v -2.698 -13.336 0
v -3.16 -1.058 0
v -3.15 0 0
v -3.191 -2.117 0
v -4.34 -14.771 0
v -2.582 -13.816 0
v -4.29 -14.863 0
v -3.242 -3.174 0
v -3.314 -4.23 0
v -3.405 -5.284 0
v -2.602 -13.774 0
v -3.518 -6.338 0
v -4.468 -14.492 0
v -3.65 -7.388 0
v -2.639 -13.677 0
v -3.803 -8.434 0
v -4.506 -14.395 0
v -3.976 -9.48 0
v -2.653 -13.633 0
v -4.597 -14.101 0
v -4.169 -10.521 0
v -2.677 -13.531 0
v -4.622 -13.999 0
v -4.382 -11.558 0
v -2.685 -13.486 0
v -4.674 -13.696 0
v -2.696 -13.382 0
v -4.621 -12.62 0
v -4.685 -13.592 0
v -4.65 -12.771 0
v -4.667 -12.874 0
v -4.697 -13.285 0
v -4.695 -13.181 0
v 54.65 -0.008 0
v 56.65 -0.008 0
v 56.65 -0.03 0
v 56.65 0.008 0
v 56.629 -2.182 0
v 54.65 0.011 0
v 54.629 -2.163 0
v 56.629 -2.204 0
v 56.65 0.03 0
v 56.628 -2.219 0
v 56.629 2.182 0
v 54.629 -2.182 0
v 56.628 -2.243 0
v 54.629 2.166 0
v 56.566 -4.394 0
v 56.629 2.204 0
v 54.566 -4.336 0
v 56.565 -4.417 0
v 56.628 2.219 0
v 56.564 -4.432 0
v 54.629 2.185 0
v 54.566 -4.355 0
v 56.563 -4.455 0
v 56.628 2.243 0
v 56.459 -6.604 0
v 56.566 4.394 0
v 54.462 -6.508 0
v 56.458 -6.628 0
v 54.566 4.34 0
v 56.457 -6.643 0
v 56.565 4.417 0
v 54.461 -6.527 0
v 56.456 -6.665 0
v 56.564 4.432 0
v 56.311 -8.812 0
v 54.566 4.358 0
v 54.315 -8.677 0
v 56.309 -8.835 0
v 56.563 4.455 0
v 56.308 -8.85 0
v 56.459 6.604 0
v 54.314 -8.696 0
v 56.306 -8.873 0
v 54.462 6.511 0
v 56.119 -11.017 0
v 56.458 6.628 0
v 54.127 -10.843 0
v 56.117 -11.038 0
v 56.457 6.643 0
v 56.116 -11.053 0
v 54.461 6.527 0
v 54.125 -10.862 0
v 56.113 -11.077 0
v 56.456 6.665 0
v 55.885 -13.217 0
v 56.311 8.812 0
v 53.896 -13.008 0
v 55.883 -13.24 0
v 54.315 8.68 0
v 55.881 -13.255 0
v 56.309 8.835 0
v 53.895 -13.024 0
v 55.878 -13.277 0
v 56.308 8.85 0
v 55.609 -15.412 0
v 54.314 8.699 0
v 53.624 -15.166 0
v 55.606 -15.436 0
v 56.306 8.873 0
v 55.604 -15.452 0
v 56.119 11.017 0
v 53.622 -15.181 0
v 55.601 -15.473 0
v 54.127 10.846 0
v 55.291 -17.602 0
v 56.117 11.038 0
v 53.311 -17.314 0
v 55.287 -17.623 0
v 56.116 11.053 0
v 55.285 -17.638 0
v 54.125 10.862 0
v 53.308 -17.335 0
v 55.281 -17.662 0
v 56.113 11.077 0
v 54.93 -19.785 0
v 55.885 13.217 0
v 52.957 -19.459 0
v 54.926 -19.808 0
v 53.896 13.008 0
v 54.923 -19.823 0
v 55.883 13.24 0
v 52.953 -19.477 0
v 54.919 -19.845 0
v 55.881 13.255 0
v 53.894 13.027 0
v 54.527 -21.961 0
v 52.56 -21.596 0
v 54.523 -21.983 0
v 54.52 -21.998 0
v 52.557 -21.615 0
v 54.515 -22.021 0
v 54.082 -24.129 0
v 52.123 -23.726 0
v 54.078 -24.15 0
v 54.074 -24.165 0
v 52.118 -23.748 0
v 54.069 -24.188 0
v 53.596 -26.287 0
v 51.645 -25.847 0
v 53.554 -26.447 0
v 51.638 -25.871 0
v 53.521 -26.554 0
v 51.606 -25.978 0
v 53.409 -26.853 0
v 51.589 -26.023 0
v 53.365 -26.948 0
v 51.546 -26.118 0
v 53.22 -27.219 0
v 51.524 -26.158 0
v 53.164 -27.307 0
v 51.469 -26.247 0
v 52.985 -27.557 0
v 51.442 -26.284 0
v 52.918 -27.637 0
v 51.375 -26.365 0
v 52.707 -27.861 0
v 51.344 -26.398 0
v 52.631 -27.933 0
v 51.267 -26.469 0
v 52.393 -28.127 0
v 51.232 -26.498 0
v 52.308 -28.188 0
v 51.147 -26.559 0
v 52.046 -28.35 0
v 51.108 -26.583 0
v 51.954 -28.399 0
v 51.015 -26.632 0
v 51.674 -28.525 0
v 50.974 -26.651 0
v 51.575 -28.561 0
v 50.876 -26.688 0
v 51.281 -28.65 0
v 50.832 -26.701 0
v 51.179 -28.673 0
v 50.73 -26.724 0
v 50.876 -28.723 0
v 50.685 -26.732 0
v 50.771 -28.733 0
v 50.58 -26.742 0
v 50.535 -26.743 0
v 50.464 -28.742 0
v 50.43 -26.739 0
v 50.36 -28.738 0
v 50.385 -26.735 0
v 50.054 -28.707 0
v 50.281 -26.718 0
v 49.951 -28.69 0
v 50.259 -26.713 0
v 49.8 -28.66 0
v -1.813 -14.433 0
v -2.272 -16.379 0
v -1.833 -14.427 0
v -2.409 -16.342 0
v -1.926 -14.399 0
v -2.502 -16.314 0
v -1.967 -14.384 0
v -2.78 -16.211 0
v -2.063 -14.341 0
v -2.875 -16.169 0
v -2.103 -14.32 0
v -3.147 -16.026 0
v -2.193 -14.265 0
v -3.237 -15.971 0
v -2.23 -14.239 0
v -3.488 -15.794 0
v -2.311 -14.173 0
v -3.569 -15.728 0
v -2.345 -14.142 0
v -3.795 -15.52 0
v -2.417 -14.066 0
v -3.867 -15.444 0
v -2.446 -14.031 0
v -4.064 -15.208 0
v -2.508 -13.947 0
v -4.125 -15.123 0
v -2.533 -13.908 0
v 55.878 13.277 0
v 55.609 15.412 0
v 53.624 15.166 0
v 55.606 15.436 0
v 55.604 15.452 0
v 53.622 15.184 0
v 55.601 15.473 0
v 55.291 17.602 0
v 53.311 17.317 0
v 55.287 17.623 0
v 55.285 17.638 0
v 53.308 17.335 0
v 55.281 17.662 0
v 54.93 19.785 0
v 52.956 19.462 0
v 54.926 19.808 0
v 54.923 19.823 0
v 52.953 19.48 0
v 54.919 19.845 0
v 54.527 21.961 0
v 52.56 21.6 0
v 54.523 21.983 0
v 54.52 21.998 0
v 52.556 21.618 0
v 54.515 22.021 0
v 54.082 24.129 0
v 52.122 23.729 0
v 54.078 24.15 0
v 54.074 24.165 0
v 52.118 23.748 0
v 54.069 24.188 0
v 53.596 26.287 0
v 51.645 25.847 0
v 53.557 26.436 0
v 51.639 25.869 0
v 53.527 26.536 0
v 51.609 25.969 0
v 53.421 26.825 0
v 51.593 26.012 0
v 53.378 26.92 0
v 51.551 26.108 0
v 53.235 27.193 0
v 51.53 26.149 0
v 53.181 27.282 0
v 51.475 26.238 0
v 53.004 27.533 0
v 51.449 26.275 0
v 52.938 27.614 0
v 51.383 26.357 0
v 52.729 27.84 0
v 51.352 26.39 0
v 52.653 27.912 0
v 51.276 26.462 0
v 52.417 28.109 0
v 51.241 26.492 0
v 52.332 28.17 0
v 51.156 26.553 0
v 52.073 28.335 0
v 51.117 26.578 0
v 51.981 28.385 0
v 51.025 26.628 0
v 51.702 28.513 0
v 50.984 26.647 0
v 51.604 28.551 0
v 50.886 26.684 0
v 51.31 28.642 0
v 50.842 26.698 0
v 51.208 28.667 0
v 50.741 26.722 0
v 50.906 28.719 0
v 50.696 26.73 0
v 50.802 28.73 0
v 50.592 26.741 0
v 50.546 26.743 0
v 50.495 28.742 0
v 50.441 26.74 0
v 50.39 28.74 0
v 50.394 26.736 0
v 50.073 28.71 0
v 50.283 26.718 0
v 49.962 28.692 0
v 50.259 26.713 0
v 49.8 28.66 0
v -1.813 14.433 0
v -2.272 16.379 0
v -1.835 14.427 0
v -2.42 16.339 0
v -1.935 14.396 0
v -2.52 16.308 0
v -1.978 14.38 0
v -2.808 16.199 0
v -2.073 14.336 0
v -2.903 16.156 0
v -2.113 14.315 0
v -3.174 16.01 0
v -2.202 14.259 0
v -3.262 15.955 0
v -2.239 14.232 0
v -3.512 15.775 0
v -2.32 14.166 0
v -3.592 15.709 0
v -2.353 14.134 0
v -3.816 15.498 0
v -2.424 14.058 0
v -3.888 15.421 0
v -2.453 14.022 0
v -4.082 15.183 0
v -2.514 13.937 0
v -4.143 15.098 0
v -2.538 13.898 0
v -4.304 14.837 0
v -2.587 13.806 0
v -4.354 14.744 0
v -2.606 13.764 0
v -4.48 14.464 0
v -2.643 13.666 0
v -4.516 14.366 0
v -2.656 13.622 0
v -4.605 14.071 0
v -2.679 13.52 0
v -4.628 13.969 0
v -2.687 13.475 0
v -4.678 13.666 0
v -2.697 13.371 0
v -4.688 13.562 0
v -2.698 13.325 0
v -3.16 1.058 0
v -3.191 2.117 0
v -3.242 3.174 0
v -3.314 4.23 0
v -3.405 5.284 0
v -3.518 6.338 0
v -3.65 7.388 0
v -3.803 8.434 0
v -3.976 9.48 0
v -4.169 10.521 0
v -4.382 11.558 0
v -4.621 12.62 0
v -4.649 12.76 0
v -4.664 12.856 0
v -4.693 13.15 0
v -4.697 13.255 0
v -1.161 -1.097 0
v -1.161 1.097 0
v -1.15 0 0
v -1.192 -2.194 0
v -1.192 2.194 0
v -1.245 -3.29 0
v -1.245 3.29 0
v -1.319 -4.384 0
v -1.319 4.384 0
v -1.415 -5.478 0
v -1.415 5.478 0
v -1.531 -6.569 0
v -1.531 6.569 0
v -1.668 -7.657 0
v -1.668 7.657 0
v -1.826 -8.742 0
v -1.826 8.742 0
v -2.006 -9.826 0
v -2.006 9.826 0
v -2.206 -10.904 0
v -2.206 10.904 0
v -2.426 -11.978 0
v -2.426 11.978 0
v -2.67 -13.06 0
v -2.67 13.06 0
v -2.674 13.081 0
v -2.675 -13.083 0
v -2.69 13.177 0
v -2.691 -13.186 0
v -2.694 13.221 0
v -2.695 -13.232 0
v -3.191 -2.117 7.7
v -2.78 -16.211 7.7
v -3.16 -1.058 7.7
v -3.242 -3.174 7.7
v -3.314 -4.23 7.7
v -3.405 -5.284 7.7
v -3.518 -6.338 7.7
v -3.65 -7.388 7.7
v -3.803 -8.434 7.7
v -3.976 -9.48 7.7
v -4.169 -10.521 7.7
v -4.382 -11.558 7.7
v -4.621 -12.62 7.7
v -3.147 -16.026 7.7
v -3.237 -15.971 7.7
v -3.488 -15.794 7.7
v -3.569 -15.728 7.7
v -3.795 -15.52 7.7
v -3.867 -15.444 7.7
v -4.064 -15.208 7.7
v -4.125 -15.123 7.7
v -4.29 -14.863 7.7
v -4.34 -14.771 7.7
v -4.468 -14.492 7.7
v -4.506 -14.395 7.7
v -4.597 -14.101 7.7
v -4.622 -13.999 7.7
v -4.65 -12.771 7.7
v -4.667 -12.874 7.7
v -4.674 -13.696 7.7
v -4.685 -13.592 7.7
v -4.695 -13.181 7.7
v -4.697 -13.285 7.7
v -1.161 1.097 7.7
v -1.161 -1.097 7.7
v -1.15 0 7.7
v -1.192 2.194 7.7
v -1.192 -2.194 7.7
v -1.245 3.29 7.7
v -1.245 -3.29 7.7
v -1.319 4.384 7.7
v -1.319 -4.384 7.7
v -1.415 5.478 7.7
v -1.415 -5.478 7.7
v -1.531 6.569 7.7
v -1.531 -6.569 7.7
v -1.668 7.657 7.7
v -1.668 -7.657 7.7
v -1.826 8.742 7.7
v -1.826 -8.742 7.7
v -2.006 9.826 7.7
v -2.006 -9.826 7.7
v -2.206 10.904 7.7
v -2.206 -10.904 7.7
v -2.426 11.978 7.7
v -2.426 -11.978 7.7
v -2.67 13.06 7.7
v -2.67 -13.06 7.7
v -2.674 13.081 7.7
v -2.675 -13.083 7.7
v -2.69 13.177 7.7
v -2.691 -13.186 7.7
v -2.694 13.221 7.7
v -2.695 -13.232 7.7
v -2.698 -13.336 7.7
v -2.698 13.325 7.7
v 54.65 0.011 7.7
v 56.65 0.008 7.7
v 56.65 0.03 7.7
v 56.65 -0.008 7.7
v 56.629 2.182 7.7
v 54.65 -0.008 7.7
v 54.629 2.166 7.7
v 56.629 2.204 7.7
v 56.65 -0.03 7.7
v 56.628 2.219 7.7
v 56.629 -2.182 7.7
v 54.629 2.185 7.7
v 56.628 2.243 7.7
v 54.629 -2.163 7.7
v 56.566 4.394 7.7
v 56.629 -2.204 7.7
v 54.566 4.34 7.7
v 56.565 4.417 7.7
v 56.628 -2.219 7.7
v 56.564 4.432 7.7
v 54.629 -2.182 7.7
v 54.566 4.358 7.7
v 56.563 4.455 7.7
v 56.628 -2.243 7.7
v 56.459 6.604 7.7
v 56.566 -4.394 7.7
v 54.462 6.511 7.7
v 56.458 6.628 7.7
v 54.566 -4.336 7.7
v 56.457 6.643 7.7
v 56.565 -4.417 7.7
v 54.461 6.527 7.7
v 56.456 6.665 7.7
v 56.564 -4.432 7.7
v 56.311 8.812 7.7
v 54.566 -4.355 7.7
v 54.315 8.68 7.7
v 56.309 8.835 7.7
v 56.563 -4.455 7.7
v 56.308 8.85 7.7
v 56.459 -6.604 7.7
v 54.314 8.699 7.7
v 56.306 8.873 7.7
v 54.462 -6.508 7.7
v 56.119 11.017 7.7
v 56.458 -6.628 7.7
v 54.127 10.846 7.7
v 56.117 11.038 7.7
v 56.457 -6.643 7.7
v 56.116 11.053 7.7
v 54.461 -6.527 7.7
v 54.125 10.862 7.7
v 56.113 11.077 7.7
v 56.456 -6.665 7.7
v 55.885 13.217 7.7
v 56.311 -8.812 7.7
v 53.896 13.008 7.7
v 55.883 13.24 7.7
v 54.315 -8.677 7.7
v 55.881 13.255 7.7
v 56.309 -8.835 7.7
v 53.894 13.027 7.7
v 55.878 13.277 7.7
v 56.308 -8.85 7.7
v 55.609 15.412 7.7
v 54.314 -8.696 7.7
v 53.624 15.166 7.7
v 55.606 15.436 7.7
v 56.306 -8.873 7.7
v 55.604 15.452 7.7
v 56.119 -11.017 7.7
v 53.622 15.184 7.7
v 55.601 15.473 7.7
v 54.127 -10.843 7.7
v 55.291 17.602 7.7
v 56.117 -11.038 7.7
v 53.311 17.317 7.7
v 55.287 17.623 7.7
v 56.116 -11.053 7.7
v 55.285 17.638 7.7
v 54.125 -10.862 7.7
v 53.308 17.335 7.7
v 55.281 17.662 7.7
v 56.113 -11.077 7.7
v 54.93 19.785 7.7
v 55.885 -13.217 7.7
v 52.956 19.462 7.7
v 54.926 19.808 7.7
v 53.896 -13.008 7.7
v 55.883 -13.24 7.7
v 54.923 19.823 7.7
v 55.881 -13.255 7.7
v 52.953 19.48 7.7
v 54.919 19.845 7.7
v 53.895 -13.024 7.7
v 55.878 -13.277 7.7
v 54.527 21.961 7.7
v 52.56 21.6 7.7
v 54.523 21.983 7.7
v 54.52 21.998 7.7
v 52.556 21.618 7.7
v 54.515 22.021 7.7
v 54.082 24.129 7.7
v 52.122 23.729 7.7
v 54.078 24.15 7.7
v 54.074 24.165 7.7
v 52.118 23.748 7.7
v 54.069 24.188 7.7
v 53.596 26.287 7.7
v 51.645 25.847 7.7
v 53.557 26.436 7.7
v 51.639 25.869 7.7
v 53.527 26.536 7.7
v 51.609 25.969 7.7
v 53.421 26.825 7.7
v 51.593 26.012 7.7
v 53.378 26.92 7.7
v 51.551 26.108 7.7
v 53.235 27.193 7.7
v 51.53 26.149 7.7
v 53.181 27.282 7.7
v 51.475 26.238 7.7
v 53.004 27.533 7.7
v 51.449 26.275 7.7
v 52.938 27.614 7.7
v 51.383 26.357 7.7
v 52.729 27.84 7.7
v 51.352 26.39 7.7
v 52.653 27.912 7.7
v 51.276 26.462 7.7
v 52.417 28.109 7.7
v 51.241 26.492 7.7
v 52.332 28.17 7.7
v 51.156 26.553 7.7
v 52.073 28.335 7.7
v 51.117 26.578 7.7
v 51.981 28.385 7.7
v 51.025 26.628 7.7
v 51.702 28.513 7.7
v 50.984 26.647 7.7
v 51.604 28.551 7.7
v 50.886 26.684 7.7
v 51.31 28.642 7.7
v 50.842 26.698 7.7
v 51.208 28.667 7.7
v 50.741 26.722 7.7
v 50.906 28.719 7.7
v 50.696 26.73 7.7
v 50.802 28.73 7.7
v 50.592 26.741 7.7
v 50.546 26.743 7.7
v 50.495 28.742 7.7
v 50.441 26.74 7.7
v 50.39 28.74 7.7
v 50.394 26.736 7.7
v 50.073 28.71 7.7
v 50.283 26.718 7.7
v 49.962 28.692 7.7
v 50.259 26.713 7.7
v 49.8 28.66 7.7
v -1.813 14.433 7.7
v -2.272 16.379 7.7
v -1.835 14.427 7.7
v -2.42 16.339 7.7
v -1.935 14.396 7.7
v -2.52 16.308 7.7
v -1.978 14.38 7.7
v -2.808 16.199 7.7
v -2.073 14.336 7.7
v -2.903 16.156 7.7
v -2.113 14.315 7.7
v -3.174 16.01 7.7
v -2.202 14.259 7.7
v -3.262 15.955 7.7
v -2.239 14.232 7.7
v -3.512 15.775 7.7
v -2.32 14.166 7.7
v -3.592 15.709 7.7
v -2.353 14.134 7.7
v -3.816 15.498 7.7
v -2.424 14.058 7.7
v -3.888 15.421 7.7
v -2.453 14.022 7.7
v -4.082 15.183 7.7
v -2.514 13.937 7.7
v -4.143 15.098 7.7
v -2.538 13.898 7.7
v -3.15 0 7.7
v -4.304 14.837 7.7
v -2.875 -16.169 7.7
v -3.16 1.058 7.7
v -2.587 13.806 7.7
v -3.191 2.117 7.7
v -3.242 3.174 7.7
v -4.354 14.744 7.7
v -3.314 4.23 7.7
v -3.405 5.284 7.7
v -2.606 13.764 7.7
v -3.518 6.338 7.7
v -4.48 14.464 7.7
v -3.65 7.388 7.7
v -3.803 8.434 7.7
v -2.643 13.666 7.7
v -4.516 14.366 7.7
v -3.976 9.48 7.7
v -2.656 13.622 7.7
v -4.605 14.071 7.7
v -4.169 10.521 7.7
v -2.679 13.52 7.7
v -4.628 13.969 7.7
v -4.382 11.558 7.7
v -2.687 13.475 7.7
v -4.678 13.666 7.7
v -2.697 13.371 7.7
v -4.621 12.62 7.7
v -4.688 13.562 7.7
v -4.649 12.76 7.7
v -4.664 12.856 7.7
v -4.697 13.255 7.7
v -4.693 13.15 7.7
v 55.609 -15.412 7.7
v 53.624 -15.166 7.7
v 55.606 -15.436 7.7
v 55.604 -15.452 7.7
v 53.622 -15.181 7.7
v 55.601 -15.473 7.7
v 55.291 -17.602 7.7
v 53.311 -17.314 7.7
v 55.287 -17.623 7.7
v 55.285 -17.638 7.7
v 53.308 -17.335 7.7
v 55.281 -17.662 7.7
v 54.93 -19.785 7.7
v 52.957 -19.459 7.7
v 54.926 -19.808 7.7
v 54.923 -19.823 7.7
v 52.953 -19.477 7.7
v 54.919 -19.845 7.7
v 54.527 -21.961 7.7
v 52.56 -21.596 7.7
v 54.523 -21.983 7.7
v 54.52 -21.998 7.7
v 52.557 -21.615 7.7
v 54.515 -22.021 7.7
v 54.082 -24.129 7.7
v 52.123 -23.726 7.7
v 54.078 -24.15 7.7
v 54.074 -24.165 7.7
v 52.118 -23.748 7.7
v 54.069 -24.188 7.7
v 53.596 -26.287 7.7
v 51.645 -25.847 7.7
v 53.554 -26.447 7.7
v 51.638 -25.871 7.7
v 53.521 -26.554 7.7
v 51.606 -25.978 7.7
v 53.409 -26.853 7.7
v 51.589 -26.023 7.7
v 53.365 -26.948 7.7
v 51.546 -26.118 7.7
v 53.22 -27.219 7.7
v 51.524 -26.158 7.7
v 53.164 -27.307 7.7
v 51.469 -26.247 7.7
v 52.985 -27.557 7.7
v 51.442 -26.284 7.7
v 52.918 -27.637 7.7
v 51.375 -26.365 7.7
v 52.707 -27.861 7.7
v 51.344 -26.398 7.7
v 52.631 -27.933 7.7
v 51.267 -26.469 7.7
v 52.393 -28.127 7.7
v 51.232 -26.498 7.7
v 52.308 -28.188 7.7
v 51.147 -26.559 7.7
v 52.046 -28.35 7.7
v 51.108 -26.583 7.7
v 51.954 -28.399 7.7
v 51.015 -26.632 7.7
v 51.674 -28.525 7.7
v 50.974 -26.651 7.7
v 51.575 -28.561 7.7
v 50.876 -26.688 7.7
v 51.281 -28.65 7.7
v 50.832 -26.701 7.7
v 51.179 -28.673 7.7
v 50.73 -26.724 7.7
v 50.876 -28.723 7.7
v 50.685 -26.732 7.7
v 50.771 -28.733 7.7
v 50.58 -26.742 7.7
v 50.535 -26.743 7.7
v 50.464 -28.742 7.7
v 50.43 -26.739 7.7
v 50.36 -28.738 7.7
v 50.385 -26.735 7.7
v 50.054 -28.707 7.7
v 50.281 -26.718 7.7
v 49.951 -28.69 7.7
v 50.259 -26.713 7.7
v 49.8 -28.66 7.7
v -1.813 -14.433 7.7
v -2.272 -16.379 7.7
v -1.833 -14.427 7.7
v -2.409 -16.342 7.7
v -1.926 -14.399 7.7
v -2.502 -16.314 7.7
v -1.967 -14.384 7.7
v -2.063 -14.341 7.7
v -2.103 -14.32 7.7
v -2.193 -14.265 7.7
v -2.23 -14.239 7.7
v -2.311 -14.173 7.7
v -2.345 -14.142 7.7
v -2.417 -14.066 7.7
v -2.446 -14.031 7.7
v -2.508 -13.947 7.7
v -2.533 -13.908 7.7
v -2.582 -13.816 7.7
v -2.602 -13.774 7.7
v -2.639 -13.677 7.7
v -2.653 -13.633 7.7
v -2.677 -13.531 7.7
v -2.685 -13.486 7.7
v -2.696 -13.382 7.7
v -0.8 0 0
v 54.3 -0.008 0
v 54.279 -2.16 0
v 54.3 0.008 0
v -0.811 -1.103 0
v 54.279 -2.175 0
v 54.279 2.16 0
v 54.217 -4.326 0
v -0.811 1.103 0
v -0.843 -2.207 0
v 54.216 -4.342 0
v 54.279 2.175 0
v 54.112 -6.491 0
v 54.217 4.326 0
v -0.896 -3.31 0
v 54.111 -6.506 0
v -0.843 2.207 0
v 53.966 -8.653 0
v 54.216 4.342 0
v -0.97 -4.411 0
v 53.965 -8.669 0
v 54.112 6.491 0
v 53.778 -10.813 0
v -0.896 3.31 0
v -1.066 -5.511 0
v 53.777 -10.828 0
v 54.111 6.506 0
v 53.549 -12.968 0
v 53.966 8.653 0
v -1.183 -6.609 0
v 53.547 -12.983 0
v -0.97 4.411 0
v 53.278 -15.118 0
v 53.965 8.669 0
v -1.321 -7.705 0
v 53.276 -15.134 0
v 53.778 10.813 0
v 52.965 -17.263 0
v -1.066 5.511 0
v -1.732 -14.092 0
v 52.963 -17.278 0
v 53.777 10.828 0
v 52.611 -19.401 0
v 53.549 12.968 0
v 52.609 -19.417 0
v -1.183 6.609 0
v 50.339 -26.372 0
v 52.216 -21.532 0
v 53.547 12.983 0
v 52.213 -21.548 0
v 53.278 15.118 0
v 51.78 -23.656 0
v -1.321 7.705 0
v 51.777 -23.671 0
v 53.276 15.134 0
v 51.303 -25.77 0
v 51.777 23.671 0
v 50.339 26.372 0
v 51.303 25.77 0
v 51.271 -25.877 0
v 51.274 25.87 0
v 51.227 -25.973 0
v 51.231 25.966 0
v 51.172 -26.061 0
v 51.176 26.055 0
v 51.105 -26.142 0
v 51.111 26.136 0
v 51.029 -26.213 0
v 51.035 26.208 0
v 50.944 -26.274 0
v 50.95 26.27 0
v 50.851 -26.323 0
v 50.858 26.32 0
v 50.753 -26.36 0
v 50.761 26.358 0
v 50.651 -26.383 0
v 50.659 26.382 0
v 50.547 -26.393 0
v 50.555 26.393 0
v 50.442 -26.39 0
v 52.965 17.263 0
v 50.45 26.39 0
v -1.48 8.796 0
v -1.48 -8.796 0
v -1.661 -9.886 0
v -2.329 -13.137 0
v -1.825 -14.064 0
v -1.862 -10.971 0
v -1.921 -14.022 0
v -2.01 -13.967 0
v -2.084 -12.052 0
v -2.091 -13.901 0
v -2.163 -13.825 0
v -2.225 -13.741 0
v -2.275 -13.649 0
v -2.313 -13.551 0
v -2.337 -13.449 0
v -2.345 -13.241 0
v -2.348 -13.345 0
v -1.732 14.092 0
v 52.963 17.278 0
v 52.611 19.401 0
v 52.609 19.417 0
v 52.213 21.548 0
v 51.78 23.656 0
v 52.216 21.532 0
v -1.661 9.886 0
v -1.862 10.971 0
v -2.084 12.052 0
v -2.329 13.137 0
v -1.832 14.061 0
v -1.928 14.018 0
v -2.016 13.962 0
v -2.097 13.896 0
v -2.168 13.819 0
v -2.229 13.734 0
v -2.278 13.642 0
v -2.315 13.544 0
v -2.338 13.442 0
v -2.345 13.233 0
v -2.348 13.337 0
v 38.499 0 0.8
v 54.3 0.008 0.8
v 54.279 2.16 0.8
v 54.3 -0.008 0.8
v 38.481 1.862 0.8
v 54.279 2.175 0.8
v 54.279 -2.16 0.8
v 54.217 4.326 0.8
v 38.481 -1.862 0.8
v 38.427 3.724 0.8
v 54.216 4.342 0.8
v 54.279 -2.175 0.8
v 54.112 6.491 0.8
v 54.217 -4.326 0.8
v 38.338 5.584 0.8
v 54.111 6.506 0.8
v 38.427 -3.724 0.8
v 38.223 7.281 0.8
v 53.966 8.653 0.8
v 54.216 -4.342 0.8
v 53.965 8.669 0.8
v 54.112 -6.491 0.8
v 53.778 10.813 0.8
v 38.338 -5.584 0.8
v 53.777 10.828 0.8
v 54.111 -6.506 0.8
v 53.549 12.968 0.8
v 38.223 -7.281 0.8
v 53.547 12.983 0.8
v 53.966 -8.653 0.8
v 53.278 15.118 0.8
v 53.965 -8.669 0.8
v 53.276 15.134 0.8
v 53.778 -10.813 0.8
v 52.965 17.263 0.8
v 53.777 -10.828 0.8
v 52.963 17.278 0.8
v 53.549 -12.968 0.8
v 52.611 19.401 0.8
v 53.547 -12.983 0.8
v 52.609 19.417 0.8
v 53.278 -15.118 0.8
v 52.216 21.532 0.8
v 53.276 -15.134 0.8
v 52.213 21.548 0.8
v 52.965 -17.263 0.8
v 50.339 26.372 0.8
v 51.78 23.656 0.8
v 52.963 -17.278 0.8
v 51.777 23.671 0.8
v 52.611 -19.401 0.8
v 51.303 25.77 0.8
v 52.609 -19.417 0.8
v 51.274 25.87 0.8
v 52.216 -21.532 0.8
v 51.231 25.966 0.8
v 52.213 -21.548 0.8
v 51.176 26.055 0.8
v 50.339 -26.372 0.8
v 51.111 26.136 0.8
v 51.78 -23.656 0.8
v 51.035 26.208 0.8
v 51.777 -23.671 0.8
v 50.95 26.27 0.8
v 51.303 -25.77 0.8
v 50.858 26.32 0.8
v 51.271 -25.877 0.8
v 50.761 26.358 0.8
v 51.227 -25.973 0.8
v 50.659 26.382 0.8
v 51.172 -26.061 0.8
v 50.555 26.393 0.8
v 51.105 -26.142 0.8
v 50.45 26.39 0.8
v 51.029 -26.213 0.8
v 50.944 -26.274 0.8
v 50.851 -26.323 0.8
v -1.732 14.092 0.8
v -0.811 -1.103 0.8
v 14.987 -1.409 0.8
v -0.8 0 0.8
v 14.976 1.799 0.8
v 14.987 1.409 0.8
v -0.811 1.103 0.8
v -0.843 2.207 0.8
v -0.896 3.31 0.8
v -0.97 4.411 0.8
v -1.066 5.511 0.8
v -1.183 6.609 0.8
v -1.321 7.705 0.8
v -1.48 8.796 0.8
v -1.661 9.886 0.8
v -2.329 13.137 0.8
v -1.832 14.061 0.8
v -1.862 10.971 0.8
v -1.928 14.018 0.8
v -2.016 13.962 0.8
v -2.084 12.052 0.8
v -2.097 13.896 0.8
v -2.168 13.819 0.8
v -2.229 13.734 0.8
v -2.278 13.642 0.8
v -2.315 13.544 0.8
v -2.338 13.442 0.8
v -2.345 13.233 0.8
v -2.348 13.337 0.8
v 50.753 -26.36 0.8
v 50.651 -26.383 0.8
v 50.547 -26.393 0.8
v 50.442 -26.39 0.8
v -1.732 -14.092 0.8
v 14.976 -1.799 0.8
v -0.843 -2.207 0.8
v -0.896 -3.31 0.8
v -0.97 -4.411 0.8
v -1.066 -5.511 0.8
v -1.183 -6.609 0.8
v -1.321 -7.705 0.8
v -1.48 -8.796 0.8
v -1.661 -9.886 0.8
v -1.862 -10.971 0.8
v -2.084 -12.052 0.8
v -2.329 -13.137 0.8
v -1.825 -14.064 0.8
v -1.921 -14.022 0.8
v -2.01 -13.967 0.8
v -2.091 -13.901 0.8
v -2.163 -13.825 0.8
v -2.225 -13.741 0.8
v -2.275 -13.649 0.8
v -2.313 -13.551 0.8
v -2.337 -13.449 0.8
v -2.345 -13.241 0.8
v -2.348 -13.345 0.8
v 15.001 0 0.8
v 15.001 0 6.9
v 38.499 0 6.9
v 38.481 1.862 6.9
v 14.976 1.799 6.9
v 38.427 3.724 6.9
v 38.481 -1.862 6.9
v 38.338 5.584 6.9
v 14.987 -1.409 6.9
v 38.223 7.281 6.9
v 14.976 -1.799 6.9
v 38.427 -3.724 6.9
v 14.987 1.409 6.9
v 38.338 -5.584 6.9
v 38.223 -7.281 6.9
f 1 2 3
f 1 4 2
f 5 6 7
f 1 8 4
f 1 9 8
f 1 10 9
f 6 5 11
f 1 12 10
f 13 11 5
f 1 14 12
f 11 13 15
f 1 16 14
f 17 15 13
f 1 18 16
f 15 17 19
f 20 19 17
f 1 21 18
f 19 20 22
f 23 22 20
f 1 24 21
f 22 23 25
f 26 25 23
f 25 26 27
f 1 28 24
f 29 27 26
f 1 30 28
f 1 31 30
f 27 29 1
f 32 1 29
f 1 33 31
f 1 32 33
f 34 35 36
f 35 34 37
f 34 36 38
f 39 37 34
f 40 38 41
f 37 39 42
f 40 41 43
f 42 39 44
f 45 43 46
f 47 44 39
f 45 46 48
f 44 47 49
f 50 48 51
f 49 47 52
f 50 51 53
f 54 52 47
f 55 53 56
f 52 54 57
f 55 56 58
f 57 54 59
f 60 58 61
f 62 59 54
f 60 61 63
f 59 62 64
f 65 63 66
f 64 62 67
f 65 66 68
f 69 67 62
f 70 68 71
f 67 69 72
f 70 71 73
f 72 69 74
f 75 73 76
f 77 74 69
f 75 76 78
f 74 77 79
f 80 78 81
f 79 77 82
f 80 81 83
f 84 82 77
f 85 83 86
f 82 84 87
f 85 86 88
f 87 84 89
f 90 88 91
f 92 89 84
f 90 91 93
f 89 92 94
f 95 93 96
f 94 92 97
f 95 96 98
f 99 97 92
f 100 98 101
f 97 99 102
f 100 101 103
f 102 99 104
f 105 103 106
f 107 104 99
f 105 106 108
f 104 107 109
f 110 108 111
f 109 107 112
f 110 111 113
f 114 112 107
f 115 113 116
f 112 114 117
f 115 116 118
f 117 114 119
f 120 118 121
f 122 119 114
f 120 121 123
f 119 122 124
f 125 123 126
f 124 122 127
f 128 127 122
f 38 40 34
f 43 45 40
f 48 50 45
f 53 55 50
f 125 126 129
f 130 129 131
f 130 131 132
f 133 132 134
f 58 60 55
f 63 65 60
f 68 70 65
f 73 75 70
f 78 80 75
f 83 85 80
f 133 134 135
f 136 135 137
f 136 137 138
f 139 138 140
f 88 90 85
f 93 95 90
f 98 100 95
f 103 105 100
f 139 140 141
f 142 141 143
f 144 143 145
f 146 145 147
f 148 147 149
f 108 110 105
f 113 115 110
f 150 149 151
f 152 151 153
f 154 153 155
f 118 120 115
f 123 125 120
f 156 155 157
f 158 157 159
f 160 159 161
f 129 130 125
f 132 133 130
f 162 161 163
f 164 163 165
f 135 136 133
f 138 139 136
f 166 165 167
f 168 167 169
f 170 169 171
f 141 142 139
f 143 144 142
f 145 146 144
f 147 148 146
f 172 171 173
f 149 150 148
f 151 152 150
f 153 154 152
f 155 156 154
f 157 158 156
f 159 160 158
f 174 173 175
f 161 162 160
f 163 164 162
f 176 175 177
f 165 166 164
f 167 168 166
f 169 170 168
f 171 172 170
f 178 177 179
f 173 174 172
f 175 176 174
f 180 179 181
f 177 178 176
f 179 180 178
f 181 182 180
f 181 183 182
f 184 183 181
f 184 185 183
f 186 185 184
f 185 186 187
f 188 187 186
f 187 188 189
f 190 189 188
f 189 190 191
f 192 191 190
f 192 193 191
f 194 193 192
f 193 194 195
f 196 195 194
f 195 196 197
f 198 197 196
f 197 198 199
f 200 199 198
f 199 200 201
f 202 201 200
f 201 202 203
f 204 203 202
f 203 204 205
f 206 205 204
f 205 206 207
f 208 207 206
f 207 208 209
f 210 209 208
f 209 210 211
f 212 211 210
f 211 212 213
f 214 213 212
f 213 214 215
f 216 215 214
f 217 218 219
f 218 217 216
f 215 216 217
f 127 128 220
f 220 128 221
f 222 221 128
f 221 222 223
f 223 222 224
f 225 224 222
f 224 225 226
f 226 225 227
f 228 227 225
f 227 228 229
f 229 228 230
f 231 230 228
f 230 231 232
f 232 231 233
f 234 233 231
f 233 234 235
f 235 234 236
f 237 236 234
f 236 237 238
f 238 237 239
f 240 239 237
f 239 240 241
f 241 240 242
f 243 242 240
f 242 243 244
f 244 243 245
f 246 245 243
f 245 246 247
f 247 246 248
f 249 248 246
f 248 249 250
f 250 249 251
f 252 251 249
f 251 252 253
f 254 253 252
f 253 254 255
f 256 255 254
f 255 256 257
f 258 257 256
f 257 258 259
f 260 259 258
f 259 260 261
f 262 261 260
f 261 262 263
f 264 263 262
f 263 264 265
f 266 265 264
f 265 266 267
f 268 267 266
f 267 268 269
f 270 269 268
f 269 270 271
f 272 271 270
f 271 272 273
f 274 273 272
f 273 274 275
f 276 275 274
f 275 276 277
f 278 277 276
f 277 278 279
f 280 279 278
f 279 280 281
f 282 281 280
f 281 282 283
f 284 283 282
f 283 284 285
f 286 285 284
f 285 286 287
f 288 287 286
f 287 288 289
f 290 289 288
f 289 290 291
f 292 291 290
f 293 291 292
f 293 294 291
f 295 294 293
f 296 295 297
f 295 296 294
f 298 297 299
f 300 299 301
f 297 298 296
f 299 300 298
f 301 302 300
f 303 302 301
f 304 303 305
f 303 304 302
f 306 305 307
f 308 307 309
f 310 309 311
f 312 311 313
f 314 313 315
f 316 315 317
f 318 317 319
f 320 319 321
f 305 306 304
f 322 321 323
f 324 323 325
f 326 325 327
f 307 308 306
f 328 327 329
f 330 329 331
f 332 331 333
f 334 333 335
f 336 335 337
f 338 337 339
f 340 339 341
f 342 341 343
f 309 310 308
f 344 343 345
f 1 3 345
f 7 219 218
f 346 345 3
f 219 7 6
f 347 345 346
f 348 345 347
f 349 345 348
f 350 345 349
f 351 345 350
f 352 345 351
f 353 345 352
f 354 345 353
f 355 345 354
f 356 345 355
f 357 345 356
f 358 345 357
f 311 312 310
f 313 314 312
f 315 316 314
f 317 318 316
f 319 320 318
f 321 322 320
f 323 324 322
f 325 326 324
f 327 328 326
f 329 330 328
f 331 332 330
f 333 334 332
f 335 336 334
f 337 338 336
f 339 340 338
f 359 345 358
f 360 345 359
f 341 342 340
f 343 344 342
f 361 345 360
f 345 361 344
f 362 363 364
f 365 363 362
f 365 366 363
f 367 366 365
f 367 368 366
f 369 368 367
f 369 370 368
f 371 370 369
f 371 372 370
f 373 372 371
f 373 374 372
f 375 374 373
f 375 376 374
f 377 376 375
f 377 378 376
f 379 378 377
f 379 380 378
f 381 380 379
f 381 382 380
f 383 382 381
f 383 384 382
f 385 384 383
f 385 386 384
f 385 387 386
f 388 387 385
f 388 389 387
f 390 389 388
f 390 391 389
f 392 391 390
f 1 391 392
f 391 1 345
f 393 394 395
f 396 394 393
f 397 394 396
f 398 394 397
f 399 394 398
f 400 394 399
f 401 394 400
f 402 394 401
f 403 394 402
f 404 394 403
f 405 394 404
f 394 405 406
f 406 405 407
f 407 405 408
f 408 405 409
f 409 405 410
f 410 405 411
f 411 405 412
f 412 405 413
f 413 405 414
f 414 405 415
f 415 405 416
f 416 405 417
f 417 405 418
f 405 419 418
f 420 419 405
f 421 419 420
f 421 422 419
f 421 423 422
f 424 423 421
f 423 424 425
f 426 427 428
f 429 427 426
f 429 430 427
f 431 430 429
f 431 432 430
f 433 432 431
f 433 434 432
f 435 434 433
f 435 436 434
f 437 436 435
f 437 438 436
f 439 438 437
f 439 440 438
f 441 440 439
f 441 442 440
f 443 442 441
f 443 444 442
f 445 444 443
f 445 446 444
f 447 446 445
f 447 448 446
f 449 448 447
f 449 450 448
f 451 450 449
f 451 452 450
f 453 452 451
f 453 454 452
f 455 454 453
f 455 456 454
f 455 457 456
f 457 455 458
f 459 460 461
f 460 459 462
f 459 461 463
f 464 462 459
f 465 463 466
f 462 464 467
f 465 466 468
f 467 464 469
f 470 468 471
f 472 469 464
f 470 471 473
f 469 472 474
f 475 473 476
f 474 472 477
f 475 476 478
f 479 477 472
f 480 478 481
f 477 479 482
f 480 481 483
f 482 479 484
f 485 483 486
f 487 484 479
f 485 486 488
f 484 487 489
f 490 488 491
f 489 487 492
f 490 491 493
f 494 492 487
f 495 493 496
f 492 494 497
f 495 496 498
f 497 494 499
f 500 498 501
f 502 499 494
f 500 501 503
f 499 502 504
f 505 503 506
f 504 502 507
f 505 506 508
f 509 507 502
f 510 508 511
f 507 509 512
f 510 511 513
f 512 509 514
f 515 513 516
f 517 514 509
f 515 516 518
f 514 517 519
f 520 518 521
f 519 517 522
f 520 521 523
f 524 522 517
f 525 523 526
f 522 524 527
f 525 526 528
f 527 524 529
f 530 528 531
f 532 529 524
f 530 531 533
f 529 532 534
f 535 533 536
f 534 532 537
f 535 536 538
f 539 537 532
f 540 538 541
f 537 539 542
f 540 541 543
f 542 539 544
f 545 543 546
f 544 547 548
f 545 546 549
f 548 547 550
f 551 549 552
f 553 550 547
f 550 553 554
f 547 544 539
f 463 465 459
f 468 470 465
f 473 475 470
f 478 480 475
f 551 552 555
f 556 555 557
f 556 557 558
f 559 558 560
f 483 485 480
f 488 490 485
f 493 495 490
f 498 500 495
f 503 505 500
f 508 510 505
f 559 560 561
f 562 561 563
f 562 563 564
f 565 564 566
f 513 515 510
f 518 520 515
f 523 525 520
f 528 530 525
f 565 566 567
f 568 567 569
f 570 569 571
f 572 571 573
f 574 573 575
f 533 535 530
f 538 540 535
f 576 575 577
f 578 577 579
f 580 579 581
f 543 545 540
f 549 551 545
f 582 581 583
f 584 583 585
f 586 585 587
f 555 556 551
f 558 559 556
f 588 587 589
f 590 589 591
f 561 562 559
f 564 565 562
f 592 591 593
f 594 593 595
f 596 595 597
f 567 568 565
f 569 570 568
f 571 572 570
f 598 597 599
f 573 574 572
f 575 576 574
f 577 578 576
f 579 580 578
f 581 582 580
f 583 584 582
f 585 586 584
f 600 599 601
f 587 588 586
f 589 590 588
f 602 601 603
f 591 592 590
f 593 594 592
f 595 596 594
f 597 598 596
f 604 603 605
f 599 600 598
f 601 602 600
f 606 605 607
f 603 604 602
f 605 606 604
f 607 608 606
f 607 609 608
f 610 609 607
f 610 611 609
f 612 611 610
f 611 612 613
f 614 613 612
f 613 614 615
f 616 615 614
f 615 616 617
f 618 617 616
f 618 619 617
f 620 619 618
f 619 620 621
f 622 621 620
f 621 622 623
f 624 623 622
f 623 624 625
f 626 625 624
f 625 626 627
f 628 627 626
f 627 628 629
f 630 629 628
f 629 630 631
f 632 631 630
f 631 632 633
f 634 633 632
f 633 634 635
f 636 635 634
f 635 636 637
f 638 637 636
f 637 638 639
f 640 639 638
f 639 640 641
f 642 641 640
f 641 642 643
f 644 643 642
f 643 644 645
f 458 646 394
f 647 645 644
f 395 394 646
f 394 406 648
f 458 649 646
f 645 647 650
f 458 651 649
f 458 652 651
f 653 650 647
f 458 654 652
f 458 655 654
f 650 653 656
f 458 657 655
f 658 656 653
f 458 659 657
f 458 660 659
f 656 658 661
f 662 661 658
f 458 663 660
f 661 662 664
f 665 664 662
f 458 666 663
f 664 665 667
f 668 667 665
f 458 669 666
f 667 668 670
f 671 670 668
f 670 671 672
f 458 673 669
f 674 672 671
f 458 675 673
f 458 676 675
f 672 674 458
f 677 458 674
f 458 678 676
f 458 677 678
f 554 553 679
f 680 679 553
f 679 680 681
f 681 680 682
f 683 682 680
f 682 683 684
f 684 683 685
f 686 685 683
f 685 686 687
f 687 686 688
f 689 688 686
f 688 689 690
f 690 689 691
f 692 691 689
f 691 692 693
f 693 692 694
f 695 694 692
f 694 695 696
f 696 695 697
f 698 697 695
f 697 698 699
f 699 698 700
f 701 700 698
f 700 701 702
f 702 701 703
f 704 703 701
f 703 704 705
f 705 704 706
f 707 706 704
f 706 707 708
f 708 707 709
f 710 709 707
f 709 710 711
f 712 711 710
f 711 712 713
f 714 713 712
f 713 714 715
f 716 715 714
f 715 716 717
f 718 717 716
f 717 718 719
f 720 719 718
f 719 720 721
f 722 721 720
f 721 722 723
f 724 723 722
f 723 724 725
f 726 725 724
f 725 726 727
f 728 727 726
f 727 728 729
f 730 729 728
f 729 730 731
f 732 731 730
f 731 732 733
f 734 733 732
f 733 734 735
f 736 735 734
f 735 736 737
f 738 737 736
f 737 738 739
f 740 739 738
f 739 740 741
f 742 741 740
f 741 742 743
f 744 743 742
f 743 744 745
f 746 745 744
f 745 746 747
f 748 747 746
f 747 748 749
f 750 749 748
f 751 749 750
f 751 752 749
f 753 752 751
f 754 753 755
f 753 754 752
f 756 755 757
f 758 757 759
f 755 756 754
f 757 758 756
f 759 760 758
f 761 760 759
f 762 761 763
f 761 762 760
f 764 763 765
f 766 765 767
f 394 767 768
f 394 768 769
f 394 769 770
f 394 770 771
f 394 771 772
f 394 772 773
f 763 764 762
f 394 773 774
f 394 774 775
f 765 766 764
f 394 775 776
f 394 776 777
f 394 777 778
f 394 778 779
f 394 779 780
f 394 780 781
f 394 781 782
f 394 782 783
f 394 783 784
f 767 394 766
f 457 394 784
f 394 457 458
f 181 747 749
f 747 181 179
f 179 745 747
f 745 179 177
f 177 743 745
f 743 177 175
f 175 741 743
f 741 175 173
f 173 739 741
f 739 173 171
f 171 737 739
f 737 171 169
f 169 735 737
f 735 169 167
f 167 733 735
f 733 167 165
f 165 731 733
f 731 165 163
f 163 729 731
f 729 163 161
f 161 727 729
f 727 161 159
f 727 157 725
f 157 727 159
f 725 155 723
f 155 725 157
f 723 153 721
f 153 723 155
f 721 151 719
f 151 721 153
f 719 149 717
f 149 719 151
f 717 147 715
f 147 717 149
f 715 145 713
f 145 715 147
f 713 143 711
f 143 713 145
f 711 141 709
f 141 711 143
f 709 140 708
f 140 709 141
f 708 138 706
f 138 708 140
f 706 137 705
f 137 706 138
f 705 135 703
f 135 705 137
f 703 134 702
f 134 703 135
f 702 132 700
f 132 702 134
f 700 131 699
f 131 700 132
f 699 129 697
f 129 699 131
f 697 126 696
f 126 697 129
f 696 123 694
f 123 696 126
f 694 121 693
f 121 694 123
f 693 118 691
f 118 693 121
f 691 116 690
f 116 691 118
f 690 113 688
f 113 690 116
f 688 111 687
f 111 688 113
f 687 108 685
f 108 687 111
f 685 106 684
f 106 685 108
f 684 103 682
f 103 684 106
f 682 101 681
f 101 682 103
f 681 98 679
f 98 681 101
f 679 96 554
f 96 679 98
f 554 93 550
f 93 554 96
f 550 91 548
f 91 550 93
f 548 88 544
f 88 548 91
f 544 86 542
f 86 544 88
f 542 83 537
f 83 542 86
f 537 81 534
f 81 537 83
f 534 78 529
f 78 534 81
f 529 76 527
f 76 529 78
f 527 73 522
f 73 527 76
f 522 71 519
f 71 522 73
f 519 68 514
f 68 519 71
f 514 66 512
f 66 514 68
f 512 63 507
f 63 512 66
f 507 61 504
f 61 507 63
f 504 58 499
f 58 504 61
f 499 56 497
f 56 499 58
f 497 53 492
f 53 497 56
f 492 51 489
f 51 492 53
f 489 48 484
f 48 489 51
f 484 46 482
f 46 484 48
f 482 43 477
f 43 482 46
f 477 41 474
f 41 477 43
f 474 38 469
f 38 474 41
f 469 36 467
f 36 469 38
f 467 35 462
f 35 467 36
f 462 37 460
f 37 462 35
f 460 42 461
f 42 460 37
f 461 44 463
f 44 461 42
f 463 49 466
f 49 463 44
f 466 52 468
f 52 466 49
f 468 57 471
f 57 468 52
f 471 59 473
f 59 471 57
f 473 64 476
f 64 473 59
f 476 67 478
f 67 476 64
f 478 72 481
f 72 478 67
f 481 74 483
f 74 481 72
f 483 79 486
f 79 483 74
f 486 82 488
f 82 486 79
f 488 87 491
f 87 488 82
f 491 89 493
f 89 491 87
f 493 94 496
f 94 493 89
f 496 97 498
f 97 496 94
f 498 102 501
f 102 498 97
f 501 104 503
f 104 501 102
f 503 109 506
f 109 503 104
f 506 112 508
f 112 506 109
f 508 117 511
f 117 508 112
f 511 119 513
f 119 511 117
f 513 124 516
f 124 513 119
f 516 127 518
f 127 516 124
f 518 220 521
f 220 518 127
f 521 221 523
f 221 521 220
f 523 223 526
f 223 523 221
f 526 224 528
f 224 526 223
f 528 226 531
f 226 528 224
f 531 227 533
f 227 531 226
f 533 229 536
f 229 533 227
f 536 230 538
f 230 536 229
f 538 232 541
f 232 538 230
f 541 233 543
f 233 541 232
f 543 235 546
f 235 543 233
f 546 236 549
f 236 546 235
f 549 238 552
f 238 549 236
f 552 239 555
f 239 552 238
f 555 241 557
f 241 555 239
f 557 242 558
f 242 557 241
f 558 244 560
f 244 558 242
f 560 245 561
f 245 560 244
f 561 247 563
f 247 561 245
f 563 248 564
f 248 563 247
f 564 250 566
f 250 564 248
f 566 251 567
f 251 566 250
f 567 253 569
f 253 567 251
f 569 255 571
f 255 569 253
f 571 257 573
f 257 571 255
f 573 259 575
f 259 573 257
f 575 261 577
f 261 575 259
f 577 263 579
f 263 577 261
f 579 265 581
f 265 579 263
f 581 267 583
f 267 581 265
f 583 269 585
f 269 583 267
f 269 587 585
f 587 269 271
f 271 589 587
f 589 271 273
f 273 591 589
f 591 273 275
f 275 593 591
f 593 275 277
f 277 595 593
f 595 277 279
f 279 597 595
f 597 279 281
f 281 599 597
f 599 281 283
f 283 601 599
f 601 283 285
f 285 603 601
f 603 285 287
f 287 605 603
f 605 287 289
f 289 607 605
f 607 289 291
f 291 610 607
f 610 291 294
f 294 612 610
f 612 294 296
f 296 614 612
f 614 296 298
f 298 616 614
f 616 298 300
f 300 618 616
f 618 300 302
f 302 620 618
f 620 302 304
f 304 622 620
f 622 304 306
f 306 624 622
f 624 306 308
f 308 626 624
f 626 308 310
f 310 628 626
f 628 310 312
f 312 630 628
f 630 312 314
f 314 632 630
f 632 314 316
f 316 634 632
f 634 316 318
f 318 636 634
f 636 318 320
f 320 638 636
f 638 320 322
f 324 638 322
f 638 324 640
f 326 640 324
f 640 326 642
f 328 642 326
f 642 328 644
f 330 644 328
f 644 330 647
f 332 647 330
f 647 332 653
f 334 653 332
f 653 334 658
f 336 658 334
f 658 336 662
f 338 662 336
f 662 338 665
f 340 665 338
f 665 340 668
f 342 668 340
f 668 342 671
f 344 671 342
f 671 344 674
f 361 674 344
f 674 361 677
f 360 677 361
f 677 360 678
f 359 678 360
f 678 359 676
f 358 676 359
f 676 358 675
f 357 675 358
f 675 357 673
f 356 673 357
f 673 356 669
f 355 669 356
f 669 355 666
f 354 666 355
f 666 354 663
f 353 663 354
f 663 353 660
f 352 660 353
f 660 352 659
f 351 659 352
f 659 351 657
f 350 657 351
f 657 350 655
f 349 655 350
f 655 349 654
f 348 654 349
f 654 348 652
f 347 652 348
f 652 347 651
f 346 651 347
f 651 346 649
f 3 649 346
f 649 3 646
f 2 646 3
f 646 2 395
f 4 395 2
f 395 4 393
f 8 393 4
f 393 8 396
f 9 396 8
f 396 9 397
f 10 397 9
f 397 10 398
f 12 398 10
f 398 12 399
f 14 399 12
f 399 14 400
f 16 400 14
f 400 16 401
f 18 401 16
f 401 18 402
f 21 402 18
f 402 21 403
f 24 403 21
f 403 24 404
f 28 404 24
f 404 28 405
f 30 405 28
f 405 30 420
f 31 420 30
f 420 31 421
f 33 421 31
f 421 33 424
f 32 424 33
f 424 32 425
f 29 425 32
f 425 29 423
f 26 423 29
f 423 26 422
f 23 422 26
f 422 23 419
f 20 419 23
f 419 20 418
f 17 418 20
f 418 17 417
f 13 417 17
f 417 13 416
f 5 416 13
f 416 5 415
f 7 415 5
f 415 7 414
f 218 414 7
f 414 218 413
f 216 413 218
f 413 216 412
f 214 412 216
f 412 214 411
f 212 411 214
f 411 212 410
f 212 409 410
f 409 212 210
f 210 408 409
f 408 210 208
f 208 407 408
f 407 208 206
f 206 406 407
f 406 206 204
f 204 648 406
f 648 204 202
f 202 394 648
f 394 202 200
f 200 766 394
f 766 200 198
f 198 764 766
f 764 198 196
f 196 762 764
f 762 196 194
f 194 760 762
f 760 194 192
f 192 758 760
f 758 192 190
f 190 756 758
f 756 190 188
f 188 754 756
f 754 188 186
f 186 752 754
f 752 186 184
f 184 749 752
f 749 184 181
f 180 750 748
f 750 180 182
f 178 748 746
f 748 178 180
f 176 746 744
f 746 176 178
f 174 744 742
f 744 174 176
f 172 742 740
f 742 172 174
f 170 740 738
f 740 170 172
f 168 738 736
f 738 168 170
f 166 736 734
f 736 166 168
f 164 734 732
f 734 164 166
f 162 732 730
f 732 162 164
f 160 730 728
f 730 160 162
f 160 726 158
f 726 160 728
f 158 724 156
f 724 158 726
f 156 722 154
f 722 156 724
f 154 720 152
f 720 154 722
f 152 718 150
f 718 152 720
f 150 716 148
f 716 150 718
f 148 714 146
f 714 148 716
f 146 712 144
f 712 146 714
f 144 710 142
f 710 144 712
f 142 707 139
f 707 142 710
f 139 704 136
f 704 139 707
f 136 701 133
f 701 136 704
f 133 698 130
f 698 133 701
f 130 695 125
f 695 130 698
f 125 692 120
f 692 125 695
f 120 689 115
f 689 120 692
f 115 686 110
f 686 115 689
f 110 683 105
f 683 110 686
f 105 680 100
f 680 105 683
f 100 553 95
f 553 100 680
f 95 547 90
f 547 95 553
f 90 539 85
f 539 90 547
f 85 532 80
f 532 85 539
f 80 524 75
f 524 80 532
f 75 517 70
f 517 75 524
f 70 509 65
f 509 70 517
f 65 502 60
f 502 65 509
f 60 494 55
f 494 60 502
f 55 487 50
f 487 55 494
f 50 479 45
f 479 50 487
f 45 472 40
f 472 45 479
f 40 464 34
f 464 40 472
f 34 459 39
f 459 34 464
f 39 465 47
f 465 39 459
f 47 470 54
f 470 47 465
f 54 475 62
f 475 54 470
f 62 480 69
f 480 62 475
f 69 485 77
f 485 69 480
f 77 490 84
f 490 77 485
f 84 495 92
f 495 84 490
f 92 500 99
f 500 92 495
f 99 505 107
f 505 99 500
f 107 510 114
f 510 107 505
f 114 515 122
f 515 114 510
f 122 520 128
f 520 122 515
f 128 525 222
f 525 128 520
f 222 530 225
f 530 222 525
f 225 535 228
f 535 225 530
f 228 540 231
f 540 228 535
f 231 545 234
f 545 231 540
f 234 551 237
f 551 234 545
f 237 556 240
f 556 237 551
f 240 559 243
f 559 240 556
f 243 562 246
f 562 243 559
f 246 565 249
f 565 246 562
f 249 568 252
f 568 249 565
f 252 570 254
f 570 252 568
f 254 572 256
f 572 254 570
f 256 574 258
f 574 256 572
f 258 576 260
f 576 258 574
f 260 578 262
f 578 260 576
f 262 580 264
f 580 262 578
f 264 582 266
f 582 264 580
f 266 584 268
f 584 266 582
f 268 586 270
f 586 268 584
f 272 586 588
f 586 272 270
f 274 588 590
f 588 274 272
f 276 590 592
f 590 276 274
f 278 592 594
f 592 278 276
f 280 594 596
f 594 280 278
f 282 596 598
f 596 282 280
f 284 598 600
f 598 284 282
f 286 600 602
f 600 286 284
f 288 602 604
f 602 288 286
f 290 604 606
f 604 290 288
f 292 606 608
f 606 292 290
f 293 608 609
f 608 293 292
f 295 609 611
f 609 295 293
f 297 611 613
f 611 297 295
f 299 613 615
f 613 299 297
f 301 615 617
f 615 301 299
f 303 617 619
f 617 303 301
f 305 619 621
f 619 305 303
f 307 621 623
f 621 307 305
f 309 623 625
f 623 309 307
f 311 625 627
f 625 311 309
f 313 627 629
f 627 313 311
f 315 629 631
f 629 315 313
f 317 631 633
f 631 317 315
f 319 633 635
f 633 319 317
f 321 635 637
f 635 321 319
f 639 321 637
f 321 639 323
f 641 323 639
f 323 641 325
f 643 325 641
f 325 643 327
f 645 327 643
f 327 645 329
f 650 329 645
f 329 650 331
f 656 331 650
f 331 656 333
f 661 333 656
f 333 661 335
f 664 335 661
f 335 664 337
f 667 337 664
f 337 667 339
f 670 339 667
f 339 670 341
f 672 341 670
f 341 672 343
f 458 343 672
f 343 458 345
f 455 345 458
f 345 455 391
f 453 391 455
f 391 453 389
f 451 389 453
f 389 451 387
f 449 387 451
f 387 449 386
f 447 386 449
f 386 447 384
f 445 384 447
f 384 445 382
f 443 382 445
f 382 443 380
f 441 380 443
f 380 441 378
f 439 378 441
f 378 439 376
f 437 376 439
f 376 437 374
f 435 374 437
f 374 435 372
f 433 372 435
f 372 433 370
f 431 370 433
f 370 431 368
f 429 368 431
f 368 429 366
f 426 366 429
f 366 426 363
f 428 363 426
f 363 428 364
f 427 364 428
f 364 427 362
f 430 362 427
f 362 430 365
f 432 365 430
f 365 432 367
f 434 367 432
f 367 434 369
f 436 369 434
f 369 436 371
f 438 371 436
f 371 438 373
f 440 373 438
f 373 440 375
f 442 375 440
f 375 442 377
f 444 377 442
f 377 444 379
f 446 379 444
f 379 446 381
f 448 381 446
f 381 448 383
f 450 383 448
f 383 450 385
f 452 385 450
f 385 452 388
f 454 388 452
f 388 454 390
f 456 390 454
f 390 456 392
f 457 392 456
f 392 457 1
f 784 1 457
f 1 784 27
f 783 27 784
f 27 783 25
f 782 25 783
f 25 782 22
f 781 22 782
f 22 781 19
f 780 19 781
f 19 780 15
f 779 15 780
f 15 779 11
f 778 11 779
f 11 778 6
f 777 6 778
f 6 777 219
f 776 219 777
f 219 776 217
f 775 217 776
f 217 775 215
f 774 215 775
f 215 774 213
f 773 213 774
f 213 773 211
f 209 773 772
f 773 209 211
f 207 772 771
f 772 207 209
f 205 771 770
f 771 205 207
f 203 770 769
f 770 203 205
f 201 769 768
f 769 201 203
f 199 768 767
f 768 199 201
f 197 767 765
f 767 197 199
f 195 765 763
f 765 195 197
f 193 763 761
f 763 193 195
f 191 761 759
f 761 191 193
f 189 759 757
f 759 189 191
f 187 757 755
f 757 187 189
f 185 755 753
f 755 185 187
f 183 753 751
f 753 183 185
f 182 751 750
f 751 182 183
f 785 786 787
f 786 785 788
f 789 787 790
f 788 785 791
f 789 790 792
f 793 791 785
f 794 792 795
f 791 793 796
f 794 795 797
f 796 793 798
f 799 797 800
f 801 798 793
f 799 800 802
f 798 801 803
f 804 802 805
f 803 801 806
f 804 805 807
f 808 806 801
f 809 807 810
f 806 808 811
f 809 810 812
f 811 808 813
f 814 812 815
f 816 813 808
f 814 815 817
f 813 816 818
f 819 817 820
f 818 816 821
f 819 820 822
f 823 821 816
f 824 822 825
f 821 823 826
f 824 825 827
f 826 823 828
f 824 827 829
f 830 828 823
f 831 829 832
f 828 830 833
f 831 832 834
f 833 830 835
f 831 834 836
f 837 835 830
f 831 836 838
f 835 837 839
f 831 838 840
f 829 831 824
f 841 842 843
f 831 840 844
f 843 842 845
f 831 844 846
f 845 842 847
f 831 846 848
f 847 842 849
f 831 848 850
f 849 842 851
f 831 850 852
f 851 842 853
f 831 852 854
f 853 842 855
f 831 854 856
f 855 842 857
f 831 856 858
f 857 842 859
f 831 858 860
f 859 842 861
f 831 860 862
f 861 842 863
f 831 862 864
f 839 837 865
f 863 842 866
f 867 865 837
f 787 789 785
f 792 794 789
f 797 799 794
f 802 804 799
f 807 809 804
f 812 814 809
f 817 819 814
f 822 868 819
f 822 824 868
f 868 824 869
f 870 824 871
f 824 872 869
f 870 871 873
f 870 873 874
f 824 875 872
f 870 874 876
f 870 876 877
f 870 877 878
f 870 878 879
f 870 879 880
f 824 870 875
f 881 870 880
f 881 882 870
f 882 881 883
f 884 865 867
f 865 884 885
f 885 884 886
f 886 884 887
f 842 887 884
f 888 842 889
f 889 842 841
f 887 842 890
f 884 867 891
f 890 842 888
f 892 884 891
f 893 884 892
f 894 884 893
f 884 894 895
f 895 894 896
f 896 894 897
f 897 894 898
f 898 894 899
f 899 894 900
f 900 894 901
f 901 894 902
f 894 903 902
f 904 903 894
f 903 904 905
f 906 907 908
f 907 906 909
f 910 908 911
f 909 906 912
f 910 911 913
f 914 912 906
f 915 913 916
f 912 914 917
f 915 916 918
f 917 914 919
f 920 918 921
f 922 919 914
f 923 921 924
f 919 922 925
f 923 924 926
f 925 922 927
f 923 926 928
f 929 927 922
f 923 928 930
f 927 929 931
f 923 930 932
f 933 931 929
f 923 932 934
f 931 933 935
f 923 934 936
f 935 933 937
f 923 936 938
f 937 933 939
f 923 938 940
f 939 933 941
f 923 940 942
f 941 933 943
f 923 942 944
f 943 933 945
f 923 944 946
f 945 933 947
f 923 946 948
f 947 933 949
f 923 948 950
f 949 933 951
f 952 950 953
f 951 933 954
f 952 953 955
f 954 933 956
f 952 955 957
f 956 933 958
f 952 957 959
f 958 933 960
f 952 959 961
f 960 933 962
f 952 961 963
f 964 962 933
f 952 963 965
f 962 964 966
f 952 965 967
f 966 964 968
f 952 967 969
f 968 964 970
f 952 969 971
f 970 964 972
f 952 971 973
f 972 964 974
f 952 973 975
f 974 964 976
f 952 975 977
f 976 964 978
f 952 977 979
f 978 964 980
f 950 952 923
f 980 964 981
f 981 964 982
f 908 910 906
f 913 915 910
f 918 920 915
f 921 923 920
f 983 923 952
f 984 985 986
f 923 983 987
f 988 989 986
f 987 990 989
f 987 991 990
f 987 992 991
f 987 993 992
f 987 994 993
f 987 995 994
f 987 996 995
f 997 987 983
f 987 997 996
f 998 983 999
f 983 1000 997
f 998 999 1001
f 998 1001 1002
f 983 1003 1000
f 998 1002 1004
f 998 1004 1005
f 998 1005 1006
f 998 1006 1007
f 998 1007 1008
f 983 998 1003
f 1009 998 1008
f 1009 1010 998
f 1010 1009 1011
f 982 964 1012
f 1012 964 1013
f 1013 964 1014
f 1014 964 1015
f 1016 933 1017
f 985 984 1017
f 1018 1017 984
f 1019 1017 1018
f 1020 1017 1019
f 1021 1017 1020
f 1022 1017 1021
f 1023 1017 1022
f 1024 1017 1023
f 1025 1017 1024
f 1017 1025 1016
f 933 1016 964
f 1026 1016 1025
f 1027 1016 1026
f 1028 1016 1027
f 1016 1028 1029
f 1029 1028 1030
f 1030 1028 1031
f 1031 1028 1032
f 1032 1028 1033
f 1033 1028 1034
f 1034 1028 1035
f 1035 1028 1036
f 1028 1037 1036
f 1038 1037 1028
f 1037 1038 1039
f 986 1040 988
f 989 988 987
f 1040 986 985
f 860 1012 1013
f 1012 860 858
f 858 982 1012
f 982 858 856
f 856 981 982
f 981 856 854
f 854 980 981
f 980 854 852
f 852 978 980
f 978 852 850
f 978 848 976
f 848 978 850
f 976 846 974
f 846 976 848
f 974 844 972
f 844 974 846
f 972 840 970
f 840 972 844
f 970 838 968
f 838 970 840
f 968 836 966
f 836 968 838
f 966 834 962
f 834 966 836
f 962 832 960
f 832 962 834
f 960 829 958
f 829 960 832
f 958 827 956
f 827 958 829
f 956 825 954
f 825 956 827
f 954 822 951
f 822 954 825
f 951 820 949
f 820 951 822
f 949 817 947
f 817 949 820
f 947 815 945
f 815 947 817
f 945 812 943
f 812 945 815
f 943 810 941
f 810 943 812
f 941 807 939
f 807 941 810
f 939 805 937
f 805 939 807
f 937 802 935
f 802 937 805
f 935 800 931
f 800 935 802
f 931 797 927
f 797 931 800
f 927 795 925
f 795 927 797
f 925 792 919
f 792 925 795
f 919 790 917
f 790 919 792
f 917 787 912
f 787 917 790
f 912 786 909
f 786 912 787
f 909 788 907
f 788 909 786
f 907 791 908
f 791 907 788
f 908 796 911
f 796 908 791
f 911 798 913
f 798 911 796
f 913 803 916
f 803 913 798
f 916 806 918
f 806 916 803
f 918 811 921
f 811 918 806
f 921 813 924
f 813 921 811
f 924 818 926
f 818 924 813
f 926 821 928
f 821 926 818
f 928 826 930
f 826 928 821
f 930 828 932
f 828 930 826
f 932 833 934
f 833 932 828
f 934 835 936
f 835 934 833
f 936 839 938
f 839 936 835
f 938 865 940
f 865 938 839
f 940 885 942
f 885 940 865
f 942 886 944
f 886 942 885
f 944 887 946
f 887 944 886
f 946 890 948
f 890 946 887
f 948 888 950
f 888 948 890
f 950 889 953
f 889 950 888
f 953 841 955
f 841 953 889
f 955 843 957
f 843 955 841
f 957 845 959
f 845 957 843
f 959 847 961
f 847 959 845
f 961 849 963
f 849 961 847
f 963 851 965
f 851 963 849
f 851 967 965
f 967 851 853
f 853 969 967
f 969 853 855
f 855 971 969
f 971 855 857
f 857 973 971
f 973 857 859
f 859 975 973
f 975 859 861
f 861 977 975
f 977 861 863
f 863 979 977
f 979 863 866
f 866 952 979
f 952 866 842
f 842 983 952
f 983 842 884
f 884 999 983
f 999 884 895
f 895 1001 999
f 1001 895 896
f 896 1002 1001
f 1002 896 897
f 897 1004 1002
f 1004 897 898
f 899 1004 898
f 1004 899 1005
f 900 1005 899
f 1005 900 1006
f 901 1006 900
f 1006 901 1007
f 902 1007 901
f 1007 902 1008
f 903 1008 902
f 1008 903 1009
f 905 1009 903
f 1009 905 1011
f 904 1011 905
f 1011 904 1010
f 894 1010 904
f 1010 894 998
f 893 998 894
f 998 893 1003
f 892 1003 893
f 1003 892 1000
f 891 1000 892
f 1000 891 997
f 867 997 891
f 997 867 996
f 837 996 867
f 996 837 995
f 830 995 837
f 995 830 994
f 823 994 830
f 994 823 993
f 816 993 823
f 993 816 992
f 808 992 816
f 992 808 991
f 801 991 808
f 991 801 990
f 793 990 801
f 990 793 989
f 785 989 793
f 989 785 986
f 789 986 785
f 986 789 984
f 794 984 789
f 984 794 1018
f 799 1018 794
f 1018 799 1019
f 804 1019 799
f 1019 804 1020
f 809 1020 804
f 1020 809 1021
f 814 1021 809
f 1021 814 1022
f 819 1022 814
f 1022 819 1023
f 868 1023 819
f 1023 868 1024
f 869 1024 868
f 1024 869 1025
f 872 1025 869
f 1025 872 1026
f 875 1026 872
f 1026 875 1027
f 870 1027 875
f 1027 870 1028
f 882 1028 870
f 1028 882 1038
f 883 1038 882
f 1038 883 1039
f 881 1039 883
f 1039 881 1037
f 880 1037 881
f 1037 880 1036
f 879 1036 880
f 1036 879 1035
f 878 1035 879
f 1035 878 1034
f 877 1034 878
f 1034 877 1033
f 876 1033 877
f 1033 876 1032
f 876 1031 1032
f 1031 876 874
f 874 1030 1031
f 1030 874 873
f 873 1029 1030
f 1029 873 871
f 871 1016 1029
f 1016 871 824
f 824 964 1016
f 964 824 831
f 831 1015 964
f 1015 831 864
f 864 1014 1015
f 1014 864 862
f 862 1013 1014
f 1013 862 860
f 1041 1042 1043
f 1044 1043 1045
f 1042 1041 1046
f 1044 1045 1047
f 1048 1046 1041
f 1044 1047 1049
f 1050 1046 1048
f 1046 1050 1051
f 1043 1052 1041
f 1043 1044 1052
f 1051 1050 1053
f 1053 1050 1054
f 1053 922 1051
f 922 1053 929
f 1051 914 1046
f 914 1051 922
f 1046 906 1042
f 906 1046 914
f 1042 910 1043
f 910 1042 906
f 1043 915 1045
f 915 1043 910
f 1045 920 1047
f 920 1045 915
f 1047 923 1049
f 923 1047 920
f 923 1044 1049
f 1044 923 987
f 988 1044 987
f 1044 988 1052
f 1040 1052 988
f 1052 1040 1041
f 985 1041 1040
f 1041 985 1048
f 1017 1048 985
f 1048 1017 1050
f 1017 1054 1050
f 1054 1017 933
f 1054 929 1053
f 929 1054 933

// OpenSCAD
// Gen-CZ — fit coupon (bay part): O20/O5 THROUGH pockets at carrier thickness (test on a steel offcut), 608 seat,
// D-flat bore, gap shim, and one bobbin-bay slice (bobbin footprint + bay_clear) to test former fit.
include <parameters.scad>;
$fn = 48;
// D-flat keyed bore: flat faces +X (angle 0 = magnet pocket 0 = index notch)
module dflat_bore(h) {
    intersection() {
        cylinder(d=shaft_bore, h=h);
        translate([-shaft_bore, -shaft_bore, 0]) cube([shaft_bore + dflat_x, 2*shaft_bore, h]);
    }
}
module sector_2d(r_in, r_out, ang) {
    polygon([
        for (a = [-ang/2 : ang/24 : ang/2]) [r_in*cos(a), r_in*sin(a)],
        for (a = [ang/2 : -ang/24 : -ang/2]) [r_out*cos(a), r_out*sin(a)]
    ]);
}
module footprint_2d() { offset(r=wall) sector_2d(coil_id_r, coil_od_r, span_deg); }
module hub_2d()       { offset(delta=-coil_core_inset) sector_2d(coil_id_r, coil_od_r, span_deg); }

// bay slice at FULL stator thickness with one bobbin BASE printed IN PLACE inside it (bay_clear gap): this is the
// print-in-place test for the one-plate stator. After printing, the base must pop out with finger pressure; if it is fused,
// print coil_former.stl separately (print-packs/parts/) instead of using the in-place bases.
translate([-coil_id_r, 0, 0]) {
    difference() {
        linear_extrude(stator_thick) offset(r=bay_clear + 2) footprint_2d();
        translate([0, 0, -0.1]) linear_extrude(stator_thick + 0.2) offset(r=bay_clear) footprint_2d();
    }
    union() {
        linear_extrude(flange_t) footprint_2d();
        translate([0, 0, flange_t - 0.01]) linear_extrude(former_web + 0.01) hub_2d();
    }
}
